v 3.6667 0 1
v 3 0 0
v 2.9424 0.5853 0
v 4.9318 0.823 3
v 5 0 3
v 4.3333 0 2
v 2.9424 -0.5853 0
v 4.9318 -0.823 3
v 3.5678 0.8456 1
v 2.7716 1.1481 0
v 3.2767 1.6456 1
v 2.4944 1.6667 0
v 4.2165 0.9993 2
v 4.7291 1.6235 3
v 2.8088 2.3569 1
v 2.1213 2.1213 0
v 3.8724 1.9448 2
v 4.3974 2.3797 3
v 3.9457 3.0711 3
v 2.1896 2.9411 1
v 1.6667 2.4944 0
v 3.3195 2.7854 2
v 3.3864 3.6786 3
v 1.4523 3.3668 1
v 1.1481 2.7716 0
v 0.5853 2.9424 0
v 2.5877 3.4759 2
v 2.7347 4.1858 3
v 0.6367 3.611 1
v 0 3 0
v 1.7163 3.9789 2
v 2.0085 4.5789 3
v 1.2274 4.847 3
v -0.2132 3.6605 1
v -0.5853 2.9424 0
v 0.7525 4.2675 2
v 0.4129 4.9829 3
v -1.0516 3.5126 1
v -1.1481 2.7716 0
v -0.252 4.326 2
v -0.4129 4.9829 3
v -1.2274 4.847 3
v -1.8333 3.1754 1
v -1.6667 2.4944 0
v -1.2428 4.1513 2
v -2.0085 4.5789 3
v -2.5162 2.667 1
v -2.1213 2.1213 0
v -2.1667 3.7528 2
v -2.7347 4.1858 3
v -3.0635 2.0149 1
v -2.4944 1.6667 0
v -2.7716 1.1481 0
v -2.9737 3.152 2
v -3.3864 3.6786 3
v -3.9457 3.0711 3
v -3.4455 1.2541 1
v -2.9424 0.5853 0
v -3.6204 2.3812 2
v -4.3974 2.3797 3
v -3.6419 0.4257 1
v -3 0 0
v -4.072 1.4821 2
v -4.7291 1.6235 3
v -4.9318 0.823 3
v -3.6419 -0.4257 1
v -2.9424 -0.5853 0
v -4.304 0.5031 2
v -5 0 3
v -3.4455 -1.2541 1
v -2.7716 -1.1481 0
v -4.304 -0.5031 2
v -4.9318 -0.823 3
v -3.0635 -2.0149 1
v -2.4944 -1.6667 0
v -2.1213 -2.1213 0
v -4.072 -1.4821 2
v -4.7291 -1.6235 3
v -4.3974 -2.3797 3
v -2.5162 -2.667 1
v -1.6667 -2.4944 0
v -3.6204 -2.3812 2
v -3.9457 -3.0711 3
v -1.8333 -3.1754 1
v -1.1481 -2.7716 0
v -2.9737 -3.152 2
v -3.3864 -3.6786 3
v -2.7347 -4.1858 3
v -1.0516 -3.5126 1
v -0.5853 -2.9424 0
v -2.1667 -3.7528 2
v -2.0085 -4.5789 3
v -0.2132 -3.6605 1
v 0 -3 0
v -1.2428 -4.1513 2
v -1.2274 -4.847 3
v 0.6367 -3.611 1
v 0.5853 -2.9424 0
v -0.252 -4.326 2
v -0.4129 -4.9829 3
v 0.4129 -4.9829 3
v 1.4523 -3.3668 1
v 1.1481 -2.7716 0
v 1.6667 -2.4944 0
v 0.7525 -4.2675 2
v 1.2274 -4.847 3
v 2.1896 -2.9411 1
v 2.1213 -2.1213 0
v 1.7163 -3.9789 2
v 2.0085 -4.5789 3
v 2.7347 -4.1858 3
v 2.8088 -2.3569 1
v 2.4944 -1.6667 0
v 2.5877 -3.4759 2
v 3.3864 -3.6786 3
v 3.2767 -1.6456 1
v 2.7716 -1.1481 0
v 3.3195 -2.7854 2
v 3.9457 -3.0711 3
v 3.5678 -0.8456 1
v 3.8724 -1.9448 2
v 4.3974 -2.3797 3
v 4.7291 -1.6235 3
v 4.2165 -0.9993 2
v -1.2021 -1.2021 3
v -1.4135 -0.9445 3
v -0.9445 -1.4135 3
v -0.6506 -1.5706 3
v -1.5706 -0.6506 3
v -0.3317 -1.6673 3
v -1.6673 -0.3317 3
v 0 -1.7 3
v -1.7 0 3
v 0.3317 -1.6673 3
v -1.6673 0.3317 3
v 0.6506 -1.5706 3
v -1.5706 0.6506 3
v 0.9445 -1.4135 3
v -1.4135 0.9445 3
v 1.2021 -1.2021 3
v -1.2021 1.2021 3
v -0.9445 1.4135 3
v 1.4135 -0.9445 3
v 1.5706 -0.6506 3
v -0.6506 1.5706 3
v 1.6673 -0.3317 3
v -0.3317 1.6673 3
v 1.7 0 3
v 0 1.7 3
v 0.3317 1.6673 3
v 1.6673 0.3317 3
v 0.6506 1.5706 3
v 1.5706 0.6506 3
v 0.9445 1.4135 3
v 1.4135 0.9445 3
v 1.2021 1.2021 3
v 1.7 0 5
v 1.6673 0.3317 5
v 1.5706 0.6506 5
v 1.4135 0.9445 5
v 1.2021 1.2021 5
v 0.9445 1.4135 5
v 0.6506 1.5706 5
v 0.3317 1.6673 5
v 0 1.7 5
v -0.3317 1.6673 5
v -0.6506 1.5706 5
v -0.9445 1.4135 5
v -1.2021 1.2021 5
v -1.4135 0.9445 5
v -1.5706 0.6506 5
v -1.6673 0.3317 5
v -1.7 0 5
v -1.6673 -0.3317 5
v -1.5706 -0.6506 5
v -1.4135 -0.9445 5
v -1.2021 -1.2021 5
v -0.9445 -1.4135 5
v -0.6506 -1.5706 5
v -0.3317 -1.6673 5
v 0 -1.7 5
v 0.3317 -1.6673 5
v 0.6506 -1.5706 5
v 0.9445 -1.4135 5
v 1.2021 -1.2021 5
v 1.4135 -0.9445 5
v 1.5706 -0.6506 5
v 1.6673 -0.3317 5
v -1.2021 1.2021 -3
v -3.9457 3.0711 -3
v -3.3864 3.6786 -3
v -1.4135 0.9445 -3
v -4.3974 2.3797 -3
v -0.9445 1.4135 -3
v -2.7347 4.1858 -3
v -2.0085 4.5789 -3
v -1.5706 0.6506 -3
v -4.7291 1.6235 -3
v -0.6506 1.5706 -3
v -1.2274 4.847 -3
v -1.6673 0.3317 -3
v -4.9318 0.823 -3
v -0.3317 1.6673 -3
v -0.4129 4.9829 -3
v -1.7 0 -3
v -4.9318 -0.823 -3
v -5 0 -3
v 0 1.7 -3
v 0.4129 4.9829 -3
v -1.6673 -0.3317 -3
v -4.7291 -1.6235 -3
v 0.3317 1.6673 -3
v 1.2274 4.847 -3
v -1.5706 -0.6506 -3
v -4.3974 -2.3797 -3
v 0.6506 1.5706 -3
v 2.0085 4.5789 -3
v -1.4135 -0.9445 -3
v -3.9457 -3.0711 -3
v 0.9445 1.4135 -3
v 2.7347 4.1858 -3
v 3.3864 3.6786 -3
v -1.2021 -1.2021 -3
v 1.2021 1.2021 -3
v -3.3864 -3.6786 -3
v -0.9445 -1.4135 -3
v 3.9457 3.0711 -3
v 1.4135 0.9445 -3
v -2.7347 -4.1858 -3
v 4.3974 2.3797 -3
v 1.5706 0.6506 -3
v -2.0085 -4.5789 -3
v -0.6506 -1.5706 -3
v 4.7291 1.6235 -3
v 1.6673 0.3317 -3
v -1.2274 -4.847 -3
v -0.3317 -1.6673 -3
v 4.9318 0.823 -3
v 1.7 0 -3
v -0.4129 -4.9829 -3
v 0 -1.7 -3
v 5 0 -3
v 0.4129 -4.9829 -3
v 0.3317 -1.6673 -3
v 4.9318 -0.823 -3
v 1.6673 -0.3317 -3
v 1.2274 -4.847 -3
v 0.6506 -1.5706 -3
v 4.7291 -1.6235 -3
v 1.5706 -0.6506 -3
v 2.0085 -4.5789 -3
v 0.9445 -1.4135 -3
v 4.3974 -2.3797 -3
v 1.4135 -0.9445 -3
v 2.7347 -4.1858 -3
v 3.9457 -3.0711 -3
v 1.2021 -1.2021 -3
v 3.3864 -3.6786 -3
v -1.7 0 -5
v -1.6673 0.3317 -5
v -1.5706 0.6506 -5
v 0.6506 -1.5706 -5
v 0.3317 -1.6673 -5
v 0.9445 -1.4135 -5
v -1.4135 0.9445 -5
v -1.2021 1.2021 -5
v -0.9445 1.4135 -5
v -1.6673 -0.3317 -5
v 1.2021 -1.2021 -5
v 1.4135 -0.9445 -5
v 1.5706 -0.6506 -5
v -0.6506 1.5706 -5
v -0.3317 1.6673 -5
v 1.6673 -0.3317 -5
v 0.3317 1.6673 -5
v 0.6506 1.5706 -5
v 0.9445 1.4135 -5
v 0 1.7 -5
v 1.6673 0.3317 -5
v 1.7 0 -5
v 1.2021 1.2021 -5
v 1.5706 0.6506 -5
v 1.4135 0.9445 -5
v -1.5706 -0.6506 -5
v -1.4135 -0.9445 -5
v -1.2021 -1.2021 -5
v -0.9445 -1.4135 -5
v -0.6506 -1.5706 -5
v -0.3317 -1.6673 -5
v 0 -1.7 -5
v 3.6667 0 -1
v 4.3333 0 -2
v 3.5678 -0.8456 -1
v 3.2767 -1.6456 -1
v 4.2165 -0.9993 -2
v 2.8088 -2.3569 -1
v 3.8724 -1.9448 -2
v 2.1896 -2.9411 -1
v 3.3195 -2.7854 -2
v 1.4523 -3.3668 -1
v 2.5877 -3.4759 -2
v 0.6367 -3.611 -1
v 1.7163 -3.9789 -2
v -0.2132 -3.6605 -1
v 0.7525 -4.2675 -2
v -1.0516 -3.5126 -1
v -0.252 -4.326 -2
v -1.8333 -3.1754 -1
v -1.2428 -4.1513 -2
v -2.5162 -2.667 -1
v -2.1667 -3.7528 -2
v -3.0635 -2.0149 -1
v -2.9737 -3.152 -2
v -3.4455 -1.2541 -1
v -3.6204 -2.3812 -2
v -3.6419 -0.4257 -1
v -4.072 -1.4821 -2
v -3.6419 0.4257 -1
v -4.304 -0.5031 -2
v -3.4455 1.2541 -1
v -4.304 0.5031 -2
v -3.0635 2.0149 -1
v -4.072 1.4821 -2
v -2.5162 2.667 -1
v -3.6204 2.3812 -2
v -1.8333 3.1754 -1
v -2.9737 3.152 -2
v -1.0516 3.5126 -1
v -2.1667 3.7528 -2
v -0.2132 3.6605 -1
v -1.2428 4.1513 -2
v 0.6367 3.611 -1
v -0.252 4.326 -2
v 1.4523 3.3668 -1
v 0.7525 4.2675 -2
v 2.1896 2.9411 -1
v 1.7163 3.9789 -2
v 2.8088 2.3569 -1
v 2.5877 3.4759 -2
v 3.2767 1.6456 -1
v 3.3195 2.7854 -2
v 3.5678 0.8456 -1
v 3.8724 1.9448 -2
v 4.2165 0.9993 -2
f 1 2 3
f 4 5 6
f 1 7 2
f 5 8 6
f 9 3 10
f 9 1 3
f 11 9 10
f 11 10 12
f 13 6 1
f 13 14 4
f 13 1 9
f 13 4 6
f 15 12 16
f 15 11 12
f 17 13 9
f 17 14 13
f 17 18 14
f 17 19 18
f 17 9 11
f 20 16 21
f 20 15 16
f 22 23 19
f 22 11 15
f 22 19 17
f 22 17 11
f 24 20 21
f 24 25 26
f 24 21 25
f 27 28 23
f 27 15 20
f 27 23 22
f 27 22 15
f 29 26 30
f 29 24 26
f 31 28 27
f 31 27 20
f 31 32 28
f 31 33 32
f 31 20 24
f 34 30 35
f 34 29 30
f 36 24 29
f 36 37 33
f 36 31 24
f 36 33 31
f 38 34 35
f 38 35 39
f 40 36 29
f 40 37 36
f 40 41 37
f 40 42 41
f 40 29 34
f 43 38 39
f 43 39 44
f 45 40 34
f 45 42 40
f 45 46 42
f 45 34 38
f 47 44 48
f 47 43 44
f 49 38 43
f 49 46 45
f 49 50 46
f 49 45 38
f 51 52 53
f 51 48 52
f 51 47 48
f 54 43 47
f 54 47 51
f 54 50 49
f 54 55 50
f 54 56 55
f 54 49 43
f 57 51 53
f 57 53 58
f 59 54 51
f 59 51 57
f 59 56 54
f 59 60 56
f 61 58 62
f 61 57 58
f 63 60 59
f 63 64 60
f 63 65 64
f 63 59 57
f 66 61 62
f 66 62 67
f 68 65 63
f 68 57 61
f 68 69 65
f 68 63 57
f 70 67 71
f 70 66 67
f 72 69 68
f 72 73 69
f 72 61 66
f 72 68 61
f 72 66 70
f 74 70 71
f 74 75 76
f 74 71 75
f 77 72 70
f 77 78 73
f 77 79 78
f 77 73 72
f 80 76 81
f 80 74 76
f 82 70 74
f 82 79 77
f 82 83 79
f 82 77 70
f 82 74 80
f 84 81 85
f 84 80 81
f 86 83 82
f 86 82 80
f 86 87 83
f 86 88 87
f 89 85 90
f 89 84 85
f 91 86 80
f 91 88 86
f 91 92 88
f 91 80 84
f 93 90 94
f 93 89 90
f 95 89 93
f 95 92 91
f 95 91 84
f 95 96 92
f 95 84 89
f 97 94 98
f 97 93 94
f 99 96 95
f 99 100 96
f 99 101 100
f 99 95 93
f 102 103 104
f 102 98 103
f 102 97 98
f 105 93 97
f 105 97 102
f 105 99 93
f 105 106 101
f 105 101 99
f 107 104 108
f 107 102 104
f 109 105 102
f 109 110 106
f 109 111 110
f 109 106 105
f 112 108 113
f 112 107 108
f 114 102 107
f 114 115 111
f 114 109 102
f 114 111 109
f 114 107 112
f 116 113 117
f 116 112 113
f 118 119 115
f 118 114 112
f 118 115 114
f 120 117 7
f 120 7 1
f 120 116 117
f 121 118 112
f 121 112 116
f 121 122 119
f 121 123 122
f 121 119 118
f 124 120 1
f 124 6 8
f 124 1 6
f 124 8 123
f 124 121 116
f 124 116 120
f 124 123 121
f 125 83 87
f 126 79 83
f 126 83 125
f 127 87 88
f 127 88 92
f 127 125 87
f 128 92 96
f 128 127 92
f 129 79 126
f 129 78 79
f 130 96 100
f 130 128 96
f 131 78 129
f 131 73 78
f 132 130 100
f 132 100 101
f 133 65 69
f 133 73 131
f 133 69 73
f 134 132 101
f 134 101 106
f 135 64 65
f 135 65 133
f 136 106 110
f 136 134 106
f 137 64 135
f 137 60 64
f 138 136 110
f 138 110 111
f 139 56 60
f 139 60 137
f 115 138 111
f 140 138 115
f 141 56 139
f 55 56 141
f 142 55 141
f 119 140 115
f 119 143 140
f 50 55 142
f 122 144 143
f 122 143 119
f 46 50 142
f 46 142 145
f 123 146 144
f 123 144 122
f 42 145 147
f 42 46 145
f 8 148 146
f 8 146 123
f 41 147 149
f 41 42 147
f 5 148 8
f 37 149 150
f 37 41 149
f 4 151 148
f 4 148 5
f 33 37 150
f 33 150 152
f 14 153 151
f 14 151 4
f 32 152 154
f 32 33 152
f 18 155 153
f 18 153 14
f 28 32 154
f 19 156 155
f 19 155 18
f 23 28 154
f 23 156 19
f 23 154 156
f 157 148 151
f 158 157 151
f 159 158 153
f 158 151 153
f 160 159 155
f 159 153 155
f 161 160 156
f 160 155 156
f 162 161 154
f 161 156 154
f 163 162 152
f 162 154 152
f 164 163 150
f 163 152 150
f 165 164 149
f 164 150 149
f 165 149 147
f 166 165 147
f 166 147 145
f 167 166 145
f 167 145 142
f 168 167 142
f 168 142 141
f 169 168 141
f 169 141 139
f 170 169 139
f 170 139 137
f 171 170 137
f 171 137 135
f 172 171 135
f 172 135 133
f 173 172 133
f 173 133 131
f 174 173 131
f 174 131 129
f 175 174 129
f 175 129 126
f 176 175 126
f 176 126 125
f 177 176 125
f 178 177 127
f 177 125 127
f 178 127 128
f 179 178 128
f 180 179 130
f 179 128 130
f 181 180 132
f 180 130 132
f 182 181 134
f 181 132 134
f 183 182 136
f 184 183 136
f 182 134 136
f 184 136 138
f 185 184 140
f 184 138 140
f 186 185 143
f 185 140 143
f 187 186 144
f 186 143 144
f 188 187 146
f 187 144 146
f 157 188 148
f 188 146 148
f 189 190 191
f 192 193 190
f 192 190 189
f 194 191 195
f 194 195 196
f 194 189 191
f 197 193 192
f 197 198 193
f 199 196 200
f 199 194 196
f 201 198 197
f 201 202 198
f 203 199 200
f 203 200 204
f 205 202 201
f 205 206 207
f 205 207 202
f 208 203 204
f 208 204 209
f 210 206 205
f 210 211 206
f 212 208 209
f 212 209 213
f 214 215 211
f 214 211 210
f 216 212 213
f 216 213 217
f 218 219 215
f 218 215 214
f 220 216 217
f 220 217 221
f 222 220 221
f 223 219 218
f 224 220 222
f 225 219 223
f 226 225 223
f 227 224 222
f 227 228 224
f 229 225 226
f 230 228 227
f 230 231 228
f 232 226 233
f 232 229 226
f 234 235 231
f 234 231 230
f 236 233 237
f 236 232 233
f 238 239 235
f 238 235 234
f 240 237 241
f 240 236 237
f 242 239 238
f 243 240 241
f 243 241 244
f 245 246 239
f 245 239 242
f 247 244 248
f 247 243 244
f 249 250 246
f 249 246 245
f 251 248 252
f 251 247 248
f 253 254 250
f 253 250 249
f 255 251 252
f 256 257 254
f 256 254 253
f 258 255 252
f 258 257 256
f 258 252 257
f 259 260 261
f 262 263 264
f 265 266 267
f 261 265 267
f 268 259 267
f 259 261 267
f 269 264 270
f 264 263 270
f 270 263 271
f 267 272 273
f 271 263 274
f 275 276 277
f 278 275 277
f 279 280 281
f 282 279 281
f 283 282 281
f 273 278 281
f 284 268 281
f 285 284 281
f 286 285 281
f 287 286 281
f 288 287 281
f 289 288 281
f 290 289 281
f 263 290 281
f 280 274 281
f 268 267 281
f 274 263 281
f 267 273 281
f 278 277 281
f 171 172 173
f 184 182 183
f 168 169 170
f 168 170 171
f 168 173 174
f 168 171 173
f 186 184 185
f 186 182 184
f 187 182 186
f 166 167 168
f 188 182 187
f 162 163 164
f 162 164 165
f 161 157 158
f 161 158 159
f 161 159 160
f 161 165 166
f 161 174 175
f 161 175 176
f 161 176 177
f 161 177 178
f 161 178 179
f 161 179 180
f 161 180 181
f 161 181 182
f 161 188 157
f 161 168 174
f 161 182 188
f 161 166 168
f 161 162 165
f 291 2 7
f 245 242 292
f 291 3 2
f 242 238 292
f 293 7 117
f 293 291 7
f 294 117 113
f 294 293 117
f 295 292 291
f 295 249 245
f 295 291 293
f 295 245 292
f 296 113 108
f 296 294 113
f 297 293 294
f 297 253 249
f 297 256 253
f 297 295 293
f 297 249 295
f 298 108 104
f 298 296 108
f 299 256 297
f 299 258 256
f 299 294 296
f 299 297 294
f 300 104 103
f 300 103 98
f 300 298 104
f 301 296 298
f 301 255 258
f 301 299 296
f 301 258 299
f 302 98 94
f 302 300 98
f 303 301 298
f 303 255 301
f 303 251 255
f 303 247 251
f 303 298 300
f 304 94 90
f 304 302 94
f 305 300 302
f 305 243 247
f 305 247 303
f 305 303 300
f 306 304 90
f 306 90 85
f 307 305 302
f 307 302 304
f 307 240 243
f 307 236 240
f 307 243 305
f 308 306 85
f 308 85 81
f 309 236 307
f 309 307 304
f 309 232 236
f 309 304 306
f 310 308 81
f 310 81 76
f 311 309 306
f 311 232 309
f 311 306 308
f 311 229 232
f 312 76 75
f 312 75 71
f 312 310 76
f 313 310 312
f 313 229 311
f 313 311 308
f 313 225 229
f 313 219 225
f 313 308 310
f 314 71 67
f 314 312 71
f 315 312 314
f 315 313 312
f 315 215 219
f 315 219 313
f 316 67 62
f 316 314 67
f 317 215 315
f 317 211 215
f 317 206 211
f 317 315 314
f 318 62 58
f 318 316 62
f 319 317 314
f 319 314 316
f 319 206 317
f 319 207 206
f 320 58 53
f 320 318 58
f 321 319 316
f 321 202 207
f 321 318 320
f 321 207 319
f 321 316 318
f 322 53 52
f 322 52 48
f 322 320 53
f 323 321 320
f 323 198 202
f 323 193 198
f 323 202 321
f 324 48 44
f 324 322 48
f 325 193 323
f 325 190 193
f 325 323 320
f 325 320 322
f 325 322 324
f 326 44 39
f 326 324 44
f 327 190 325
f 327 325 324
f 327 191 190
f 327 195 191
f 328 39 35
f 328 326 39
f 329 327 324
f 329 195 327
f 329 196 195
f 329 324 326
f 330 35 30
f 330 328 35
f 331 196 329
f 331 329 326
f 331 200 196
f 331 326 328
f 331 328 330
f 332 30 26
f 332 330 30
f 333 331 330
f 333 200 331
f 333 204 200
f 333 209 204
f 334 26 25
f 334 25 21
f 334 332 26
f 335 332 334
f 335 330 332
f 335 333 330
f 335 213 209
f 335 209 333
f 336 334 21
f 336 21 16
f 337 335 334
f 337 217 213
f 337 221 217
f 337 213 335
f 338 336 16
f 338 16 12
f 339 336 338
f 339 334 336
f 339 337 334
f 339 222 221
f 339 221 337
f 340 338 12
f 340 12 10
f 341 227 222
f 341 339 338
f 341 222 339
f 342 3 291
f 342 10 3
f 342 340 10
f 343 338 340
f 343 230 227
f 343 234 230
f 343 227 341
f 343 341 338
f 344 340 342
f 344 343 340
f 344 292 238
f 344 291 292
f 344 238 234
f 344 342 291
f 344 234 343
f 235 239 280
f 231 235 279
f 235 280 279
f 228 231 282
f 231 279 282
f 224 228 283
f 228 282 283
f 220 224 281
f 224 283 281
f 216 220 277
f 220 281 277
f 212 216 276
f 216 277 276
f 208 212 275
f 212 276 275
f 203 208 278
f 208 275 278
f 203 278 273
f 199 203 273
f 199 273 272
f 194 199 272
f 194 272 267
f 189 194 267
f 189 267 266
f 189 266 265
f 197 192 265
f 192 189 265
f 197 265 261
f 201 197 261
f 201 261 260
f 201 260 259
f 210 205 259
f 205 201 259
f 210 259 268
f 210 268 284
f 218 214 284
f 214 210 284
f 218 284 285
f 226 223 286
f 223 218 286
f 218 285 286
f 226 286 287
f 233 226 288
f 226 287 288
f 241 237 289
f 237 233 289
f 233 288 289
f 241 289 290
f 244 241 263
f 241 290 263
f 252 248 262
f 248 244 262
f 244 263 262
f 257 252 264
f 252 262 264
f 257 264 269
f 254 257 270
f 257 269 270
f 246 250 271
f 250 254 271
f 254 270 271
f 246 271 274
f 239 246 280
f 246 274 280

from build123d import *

# Parameters (mm, degrees)
CYLINDER_R     = 1.7
CYLINDER_DEPTH = 10


with BuildPart() as cono:
    # Cone → Cone (revolve)
    with BuildSketch(Plane.XZ):
        Polygon((0, 0), (3, 0), (5, 3), (0, 3), align=None)
    revolve(axis=Axis((0, 0, 0), (0, 0, 1)))


with BuildPart() as fusion:
    # Cone001 → Cone001 (revolve)
    with BuildSketch(Plane(origin=(0, 0, 0), x_dir=(1, 0, 0), z_dir=(0, 1, 0))):
        Polygon((0, 0), (3, 0), (5, 3), (0, 3), align=None)
    revolve(axis=Axis((0, 0, 0), (0, 0, -1)))

    # Fusion: union Cono
    add(cono.part)


with BuildPart() as fusion001002:
    # Cylinder → Cylinder (new body)
    with BuildSketch(Plane.XY.offset(-5)):
        Circle(CYLINDER_R)
    extrude(amount=CYLINDER_DEPTH)

    # Fusion001002: union Fusion
    add(fusion.part)


solid = fusion001002.part
